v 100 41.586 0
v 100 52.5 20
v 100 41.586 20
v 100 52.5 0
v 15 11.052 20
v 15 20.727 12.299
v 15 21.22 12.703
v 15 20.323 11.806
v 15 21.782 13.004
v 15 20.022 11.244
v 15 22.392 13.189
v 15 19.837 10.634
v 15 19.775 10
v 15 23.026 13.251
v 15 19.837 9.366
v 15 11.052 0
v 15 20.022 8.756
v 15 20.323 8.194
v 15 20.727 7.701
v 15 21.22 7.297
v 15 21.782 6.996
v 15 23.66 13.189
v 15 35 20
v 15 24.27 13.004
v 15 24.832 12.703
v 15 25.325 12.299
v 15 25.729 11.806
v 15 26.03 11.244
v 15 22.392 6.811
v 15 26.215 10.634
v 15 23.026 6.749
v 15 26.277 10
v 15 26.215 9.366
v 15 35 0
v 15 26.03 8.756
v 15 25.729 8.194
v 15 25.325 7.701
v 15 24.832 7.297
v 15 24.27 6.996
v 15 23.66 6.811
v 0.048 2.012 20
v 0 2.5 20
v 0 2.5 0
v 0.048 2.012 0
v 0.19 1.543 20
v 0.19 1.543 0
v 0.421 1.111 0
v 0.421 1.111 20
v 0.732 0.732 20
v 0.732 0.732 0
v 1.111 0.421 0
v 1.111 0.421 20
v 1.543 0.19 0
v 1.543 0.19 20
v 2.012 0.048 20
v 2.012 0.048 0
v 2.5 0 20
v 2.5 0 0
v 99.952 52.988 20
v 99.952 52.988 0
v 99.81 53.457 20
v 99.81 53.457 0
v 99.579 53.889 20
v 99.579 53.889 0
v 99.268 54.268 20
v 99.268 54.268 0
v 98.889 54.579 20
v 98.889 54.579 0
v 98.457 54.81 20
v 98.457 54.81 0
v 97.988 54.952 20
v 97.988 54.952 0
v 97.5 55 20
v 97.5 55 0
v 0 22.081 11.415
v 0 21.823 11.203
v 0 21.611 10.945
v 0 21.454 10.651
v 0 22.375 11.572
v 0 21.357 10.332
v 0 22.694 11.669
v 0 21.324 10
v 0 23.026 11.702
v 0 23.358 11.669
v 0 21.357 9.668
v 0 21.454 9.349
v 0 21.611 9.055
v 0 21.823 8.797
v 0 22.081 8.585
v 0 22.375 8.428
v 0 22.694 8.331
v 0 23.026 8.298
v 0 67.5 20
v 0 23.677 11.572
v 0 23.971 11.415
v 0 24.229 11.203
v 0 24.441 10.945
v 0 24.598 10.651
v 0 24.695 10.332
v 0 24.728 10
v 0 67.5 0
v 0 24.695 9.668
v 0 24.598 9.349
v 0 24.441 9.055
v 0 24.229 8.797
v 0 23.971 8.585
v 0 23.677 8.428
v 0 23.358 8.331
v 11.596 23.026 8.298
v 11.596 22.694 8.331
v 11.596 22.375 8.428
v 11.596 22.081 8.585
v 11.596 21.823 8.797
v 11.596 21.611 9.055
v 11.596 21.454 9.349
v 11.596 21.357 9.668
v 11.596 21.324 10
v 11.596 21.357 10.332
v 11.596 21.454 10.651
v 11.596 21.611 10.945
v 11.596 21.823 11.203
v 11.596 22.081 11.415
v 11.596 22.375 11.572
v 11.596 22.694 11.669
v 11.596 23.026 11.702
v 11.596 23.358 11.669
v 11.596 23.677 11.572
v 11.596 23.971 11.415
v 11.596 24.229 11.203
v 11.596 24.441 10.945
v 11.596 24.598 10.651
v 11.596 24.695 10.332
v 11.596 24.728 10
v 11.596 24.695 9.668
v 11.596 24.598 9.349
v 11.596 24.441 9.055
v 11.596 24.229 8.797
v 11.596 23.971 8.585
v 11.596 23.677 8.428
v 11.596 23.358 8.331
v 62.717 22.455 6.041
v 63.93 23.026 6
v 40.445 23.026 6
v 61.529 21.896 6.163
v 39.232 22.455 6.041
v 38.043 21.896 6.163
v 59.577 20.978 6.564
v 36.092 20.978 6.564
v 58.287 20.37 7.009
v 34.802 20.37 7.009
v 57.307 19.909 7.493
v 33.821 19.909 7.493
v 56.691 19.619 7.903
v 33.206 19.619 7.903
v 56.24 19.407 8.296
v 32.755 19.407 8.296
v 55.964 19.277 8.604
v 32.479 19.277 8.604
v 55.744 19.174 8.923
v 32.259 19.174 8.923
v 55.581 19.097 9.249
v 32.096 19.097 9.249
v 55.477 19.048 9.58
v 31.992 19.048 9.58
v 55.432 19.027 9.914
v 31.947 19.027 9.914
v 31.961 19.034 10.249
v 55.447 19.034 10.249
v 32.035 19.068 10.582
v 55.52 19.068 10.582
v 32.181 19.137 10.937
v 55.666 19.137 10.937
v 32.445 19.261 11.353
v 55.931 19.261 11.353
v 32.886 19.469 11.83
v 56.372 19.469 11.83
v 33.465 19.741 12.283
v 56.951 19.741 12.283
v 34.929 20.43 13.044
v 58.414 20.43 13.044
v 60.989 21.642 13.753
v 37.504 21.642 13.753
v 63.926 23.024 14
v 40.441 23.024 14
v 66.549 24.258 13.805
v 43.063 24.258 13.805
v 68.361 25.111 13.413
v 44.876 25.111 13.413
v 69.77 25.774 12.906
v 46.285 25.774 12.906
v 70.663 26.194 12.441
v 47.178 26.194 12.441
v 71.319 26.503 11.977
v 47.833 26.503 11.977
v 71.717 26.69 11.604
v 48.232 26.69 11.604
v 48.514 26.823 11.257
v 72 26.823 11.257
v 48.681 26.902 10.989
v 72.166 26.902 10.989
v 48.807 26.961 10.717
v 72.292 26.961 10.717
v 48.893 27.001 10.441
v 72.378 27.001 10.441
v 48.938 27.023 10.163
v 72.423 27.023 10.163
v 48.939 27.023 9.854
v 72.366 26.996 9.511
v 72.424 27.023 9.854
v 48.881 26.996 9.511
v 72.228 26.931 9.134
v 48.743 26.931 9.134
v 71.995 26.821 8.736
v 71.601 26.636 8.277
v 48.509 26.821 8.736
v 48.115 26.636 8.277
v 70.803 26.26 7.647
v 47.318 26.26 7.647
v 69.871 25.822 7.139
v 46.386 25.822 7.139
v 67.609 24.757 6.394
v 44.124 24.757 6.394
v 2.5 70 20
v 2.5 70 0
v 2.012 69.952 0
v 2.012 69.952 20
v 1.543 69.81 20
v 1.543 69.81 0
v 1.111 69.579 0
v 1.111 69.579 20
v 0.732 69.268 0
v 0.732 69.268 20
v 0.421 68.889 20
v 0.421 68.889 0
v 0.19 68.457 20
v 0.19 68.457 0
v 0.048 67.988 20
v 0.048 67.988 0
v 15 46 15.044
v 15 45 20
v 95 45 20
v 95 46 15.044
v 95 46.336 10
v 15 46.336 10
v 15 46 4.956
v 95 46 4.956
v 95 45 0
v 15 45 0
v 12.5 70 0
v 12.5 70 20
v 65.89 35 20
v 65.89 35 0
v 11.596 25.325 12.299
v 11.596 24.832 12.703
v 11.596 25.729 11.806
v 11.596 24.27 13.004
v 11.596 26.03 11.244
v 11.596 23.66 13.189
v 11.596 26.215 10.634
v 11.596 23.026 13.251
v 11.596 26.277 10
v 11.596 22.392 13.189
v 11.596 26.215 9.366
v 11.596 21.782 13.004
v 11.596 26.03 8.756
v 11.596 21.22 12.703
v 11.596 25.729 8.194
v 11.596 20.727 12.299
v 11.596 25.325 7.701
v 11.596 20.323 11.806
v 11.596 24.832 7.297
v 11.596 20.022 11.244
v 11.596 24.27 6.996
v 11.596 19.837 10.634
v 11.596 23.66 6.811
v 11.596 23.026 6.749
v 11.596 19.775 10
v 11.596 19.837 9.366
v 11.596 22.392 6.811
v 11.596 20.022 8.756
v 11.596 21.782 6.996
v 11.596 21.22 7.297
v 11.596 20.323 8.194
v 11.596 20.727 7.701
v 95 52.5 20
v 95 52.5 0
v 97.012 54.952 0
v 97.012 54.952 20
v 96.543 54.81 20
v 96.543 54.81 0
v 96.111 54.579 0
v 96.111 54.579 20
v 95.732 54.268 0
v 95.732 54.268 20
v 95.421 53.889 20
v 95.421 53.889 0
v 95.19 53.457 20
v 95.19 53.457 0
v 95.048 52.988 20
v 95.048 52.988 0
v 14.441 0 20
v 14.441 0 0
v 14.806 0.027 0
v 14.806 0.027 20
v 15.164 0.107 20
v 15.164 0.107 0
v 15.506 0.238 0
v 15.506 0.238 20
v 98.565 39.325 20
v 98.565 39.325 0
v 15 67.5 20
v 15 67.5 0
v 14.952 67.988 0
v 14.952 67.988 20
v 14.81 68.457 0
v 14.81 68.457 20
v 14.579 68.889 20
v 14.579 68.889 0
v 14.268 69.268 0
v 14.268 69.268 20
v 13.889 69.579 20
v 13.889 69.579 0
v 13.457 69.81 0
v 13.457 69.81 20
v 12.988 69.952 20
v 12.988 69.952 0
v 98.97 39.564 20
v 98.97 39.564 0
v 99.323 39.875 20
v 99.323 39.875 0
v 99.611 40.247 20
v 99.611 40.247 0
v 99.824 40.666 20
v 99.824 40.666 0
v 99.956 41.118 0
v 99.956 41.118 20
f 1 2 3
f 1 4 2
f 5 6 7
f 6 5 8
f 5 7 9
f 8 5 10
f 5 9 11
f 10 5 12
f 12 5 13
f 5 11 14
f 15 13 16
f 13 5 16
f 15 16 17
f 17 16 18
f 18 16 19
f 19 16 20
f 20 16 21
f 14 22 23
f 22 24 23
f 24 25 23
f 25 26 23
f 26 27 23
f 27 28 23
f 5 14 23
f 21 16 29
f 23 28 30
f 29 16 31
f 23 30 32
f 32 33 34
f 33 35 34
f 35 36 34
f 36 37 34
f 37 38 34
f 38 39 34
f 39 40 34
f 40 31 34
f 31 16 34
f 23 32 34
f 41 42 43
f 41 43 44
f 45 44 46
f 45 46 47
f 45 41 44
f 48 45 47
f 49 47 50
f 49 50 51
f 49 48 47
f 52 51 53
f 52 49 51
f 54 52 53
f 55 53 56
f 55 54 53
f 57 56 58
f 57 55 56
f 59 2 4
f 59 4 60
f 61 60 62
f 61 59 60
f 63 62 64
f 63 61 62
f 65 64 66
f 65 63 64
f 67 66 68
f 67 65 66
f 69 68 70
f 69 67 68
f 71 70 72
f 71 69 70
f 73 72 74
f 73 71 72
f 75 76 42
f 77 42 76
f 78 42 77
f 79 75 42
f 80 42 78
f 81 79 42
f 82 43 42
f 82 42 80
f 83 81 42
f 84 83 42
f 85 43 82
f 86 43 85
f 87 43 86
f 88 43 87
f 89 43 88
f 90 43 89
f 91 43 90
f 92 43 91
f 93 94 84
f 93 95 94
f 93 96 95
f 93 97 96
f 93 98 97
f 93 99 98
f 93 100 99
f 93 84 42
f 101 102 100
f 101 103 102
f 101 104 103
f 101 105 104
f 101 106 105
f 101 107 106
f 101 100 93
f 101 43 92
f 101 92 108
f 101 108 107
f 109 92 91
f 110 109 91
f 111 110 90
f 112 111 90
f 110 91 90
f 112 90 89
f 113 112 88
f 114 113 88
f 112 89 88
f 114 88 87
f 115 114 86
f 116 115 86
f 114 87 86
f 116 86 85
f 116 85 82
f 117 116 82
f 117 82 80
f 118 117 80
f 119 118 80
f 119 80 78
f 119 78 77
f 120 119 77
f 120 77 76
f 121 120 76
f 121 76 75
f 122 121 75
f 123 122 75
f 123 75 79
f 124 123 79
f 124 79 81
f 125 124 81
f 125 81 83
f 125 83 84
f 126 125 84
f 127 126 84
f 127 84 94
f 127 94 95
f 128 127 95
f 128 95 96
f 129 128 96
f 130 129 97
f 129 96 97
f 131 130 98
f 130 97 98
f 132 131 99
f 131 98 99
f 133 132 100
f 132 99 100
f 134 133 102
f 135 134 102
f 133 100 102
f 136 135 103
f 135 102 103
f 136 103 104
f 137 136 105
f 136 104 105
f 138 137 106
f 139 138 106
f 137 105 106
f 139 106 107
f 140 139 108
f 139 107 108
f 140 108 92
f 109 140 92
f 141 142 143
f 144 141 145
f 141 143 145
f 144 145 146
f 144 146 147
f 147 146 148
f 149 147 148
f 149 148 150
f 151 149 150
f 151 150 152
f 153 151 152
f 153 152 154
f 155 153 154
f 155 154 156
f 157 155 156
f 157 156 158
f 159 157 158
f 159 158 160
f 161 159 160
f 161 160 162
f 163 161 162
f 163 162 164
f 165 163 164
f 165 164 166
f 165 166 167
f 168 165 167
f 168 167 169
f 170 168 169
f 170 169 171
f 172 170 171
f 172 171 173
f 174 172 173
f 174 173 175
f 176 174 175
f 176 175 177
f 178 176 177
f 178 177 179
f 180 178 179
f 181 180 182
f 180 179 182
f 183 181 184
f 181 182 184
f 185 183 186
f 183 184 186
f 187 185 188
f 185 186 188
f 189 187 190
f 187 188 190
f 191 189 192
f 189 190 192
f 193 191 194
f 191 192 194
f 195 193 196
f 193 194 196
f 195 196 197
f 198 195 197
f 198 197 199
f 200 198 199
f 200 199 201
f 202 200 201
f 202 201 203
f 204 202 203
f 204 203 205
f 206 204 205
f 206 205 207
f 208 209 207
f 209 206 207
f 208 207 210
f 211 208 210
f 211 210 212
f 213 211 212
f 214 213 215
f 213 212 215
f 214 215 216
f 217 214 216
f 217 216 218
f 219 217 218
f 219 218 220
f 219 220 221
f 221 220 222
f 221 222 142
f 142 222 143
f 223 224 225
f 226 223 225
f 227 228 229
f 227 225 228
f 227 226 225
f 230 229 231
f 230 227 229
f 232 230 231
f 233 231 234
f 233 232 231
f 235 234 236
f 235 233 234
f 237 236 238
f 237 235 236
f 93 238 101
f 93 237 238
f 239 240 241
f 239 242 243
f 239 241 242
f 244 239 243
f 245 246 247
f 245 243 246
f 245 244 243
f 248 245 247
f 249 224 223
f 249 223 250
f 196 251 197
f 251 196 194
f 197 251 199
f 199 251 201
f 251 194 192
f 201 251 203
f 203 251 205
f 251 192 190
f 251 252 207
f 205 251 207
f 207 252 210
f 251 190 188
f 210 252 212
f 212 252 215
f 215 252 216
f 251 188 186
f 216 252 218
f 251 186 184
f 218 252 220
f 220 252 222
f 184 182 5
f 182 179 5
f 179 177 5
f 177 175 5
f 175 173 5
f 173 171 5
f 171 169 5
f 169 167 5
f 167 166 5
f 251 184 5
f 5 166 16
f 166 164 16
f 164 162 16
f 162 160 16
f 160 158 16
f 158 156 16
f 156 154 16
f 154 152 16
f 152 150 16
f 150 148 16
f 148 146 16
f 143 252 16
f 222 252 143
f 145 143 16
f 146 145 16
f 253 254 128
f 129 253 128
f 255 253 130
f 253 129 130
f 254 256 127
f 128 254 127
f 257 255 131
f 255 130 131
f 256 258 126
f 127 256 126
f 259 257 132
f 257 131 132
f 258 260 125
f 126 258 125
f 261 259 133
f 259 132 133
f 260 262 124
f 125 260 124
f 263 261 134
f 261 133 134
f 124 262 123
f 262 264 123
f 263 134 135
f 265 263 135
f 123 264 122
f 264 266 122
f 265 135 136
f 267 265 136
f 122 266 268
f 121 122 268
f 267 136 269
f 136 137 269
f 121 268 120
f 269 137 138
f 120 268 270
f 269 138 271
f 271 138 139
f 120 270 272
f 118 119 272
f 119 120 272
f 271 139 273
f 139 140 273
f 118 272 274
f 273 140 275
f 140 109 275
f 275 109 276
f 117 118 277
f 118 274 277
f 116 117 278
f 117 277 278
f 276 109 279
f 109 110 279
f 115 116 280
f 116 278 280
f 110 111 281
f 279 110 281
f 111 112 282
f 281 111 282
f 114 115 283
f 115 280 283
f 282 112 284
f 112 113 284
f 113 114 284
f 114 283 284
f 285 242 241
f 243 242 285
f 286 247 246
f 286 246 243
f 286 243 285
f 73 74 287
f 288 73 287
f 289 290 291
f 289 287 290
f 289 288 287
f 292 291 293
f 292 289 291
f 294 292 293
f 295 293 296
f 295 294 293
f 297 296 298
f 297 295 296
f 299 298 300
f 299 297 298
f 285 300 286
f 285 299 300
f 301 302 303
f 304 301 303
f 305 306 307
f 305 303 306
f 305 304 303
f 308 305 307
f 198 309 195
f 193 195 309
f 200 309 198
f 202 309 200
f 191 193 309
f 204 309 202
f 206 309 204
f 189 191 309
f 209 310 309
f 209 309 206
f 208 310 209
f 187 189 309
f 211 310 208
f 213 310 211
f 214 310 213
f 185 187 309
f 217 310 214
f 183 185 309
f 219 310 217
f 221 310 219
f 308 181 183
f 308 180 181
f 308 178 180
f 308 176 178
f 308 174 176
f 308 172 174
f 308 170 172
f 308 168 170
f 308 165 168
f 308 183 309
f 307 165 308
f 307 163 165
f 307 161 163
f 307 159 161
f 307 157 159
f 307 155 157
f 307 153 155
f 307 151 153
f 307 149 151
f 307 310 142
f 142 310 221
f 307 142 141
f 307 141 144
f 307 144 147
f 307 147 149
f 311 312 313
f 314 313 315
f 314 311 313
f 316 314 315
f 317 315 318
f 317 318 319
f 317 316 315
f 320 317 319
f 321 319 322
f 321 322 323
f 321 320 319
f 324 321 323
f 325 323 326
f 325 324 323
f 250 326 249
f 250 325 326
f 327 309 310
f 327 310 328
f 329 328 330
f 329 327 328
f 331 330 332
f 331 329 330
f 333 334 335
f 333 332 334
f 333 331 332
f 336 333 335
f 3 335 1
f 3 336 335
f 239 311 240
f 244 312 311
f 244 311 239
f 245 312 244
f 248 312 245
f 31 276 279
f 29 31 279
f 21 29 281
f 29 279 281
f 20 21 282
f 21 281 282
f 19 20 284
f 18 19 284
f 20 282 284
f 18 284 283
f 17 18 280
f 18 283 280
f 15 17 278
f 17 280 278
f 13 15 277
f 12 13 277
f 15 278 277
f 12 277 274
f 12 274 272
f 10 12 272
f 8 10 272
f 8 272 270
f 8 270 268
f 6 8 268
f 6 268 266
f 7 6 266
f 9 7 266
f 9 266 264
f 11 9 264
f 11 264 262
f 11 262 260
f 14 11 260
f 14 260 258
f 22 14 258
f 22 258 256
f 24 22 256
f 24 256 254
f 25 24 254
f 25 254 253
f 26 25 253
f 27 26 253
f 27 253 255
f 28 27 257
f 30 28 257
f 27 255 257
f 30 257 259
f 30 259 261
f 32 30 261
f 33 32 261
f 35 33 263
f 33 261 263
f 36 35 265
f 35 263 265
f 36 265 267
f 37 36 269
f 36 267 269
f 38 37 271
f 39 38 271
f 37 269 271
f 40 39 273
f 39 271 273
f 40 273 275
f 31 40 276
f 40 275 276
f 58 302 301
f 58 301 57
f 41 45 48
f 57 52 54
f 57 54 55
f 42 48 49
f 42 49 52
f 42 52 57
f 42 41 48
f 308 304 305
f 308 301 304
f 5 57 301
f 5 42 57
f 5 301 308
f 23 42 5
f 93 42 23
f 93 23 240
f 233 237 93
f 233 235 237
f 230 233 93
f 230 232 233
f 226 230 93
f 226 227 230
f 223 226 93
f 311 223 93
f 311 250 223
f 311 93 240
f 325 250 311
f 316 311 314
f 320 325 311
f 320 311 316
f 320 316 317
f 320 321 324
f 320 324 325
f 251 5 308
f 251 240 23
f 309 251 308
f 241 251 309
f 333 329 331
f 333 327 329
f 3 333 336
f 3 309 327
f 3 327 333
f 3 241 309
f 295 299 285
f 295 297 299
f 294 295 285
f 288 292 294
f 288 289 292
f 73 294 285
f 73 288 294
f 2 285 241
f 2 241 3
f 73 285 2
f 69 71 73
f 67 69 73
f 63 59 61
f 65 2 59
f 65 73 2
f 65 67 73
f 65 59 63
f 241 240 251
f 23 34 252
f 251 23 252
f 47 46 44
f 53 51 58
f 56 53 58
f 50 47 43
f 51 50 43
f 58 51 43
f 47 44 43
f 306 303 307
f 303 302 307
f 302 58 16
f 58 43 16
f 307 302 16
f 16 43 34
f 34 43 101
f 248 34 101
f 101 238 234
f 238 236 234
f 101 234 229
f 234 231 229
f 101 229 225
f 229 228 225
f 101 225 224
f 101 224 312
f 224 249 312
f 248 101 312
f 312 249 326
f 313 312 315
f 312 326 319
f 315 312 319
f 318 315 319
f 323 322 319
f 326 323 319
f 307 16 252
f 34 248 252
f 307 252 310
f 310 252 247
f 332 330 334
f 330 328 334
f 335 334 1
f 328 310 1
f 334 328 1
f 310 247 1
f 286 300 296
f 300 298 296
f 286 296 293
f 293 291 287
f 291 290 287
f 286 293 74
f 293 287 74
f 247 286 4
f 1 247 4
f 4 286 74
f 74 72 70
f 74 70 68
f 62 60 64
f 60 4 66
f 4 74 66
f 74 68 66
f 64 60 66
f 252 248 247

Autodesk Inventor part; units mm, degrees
ref_plane "YZ Plane" through (0, 0, 0) normal (1, 0, 0) x (0, 1, 0)
ref_plane "XZ Plane" through (0, 0, 0) normal (0, 1, 0) x (-1, 0, 0)
ref_plane "XY Plane" through (0, 0, 0) normal (0, 0, 1) x (1, 0, 0)
sketch "Sketch1" plane through (0, 0, 0) normal (0, 0, 1) x (1, 0, 0)
  line L0 (0, 0) -> (0, 70)
  line L1 (0, 70) -> (15, 70)
  line L2 (15, 70) -> (15, 45)
  line L3 (15, 45) -> (95, 45)
  line L4 (95, 45) -> (95, 55)
  line L5 (95, 55) -> (100, 55)
  line L6 (100, 55) -> (100, 40)
  line L7 (100, 40) -> (15, 0)
  line L8 (15, 0) -> (0, 0)
  line L9 (100, 40) -> (95, 45) construction
  line L10 (15, 35) -> (65.8896, 35)
  line L11 (65.8896, 35) -> (15, 11.0519)
  line L12 (15, 11.0519) -> (15, 35)
  dimension "d0" = 5
  dimension "d1" = 80
  dimension "d2" = 70
  dimension "d3" = 25
  dimension "d4" = 15
  dimension "d5" = 15
  dimension "d6" = 10
  dimension "d7" = 135
  dimension "d8" = 10
  dimension "d9" = 10
  dimension "d10" = 15
extrude "Extrusion1" add sketch "Sketch1" along normal blind 20
sketch "Sketch2" plane through (15, 11.0519, 0) normal (1, 0, 0) x (0, 0, -1)
  line L0 (0, 0) -> (0, 23.9481) projected
  line L1 (0, 23.9481) -> (-20, 23.9481) projected
  line L2 (-20, 0) -> (-20, 23.9481) projected
  line L3 (0, 0) -> (-20, 0) projected
  circle A0 centre (-10, 11.974) radius 4
  line L4 (0, 23.9481) -> (-20, 23.9481) construction
  line L5 (-10, 23.9481) -> (-10, 0) construction
  point P0 (0, -11.0519)
  dimension "d14" = 8
extrude "Extrusion2" cut sketch "Sketch2" along normal blind 71.75 contours A0
hole "Hole1" at (15, 23.026, 10) direction (-1, 0, 0) diameter 3.4036 end through all counterbore diameter 6.5024 counterbore depth 3.4036 clearance for "Socket Head Cap Screw ISO 4762" size "M3" standard "ISO"
sketch "Sketch3" plane through (15, 45, 0) normal (1, 0, 0) x (0, 0, -1)
  line L0 (0, 0) -> (0, 25) projected
  line L1 (0, 25) -> (-20, 25) projected
  line L2 (-20, 0) -> (-20, 25) projected
  line L3 (0, 0) -> (-20, 0) projected
  circle A0 centre (-10, -36.7642) radius 38.1
  point P0 (0, -45)
  dimension "d28" = 76.2
extrude "Extrusion3" add sketch "Sketch3" along normal up to surface (80 mm away) contours L3 A0 picked at (-11.1228, 0.3955)
fillet "Fillet1" radius 2.5 7 edges at (15, 70, 10) (0, 70, 10) (95, 55, 10) (100, 55, 10) (0, 0, 10) (15, 0, 10) (100, 40, 10)
equation "\"d4\" = d5"
equation "\"d10\" = d5"
equation "\"d14\" = d13"
equation "\"d13\" = 8"
properties part number "Spool Holder"
